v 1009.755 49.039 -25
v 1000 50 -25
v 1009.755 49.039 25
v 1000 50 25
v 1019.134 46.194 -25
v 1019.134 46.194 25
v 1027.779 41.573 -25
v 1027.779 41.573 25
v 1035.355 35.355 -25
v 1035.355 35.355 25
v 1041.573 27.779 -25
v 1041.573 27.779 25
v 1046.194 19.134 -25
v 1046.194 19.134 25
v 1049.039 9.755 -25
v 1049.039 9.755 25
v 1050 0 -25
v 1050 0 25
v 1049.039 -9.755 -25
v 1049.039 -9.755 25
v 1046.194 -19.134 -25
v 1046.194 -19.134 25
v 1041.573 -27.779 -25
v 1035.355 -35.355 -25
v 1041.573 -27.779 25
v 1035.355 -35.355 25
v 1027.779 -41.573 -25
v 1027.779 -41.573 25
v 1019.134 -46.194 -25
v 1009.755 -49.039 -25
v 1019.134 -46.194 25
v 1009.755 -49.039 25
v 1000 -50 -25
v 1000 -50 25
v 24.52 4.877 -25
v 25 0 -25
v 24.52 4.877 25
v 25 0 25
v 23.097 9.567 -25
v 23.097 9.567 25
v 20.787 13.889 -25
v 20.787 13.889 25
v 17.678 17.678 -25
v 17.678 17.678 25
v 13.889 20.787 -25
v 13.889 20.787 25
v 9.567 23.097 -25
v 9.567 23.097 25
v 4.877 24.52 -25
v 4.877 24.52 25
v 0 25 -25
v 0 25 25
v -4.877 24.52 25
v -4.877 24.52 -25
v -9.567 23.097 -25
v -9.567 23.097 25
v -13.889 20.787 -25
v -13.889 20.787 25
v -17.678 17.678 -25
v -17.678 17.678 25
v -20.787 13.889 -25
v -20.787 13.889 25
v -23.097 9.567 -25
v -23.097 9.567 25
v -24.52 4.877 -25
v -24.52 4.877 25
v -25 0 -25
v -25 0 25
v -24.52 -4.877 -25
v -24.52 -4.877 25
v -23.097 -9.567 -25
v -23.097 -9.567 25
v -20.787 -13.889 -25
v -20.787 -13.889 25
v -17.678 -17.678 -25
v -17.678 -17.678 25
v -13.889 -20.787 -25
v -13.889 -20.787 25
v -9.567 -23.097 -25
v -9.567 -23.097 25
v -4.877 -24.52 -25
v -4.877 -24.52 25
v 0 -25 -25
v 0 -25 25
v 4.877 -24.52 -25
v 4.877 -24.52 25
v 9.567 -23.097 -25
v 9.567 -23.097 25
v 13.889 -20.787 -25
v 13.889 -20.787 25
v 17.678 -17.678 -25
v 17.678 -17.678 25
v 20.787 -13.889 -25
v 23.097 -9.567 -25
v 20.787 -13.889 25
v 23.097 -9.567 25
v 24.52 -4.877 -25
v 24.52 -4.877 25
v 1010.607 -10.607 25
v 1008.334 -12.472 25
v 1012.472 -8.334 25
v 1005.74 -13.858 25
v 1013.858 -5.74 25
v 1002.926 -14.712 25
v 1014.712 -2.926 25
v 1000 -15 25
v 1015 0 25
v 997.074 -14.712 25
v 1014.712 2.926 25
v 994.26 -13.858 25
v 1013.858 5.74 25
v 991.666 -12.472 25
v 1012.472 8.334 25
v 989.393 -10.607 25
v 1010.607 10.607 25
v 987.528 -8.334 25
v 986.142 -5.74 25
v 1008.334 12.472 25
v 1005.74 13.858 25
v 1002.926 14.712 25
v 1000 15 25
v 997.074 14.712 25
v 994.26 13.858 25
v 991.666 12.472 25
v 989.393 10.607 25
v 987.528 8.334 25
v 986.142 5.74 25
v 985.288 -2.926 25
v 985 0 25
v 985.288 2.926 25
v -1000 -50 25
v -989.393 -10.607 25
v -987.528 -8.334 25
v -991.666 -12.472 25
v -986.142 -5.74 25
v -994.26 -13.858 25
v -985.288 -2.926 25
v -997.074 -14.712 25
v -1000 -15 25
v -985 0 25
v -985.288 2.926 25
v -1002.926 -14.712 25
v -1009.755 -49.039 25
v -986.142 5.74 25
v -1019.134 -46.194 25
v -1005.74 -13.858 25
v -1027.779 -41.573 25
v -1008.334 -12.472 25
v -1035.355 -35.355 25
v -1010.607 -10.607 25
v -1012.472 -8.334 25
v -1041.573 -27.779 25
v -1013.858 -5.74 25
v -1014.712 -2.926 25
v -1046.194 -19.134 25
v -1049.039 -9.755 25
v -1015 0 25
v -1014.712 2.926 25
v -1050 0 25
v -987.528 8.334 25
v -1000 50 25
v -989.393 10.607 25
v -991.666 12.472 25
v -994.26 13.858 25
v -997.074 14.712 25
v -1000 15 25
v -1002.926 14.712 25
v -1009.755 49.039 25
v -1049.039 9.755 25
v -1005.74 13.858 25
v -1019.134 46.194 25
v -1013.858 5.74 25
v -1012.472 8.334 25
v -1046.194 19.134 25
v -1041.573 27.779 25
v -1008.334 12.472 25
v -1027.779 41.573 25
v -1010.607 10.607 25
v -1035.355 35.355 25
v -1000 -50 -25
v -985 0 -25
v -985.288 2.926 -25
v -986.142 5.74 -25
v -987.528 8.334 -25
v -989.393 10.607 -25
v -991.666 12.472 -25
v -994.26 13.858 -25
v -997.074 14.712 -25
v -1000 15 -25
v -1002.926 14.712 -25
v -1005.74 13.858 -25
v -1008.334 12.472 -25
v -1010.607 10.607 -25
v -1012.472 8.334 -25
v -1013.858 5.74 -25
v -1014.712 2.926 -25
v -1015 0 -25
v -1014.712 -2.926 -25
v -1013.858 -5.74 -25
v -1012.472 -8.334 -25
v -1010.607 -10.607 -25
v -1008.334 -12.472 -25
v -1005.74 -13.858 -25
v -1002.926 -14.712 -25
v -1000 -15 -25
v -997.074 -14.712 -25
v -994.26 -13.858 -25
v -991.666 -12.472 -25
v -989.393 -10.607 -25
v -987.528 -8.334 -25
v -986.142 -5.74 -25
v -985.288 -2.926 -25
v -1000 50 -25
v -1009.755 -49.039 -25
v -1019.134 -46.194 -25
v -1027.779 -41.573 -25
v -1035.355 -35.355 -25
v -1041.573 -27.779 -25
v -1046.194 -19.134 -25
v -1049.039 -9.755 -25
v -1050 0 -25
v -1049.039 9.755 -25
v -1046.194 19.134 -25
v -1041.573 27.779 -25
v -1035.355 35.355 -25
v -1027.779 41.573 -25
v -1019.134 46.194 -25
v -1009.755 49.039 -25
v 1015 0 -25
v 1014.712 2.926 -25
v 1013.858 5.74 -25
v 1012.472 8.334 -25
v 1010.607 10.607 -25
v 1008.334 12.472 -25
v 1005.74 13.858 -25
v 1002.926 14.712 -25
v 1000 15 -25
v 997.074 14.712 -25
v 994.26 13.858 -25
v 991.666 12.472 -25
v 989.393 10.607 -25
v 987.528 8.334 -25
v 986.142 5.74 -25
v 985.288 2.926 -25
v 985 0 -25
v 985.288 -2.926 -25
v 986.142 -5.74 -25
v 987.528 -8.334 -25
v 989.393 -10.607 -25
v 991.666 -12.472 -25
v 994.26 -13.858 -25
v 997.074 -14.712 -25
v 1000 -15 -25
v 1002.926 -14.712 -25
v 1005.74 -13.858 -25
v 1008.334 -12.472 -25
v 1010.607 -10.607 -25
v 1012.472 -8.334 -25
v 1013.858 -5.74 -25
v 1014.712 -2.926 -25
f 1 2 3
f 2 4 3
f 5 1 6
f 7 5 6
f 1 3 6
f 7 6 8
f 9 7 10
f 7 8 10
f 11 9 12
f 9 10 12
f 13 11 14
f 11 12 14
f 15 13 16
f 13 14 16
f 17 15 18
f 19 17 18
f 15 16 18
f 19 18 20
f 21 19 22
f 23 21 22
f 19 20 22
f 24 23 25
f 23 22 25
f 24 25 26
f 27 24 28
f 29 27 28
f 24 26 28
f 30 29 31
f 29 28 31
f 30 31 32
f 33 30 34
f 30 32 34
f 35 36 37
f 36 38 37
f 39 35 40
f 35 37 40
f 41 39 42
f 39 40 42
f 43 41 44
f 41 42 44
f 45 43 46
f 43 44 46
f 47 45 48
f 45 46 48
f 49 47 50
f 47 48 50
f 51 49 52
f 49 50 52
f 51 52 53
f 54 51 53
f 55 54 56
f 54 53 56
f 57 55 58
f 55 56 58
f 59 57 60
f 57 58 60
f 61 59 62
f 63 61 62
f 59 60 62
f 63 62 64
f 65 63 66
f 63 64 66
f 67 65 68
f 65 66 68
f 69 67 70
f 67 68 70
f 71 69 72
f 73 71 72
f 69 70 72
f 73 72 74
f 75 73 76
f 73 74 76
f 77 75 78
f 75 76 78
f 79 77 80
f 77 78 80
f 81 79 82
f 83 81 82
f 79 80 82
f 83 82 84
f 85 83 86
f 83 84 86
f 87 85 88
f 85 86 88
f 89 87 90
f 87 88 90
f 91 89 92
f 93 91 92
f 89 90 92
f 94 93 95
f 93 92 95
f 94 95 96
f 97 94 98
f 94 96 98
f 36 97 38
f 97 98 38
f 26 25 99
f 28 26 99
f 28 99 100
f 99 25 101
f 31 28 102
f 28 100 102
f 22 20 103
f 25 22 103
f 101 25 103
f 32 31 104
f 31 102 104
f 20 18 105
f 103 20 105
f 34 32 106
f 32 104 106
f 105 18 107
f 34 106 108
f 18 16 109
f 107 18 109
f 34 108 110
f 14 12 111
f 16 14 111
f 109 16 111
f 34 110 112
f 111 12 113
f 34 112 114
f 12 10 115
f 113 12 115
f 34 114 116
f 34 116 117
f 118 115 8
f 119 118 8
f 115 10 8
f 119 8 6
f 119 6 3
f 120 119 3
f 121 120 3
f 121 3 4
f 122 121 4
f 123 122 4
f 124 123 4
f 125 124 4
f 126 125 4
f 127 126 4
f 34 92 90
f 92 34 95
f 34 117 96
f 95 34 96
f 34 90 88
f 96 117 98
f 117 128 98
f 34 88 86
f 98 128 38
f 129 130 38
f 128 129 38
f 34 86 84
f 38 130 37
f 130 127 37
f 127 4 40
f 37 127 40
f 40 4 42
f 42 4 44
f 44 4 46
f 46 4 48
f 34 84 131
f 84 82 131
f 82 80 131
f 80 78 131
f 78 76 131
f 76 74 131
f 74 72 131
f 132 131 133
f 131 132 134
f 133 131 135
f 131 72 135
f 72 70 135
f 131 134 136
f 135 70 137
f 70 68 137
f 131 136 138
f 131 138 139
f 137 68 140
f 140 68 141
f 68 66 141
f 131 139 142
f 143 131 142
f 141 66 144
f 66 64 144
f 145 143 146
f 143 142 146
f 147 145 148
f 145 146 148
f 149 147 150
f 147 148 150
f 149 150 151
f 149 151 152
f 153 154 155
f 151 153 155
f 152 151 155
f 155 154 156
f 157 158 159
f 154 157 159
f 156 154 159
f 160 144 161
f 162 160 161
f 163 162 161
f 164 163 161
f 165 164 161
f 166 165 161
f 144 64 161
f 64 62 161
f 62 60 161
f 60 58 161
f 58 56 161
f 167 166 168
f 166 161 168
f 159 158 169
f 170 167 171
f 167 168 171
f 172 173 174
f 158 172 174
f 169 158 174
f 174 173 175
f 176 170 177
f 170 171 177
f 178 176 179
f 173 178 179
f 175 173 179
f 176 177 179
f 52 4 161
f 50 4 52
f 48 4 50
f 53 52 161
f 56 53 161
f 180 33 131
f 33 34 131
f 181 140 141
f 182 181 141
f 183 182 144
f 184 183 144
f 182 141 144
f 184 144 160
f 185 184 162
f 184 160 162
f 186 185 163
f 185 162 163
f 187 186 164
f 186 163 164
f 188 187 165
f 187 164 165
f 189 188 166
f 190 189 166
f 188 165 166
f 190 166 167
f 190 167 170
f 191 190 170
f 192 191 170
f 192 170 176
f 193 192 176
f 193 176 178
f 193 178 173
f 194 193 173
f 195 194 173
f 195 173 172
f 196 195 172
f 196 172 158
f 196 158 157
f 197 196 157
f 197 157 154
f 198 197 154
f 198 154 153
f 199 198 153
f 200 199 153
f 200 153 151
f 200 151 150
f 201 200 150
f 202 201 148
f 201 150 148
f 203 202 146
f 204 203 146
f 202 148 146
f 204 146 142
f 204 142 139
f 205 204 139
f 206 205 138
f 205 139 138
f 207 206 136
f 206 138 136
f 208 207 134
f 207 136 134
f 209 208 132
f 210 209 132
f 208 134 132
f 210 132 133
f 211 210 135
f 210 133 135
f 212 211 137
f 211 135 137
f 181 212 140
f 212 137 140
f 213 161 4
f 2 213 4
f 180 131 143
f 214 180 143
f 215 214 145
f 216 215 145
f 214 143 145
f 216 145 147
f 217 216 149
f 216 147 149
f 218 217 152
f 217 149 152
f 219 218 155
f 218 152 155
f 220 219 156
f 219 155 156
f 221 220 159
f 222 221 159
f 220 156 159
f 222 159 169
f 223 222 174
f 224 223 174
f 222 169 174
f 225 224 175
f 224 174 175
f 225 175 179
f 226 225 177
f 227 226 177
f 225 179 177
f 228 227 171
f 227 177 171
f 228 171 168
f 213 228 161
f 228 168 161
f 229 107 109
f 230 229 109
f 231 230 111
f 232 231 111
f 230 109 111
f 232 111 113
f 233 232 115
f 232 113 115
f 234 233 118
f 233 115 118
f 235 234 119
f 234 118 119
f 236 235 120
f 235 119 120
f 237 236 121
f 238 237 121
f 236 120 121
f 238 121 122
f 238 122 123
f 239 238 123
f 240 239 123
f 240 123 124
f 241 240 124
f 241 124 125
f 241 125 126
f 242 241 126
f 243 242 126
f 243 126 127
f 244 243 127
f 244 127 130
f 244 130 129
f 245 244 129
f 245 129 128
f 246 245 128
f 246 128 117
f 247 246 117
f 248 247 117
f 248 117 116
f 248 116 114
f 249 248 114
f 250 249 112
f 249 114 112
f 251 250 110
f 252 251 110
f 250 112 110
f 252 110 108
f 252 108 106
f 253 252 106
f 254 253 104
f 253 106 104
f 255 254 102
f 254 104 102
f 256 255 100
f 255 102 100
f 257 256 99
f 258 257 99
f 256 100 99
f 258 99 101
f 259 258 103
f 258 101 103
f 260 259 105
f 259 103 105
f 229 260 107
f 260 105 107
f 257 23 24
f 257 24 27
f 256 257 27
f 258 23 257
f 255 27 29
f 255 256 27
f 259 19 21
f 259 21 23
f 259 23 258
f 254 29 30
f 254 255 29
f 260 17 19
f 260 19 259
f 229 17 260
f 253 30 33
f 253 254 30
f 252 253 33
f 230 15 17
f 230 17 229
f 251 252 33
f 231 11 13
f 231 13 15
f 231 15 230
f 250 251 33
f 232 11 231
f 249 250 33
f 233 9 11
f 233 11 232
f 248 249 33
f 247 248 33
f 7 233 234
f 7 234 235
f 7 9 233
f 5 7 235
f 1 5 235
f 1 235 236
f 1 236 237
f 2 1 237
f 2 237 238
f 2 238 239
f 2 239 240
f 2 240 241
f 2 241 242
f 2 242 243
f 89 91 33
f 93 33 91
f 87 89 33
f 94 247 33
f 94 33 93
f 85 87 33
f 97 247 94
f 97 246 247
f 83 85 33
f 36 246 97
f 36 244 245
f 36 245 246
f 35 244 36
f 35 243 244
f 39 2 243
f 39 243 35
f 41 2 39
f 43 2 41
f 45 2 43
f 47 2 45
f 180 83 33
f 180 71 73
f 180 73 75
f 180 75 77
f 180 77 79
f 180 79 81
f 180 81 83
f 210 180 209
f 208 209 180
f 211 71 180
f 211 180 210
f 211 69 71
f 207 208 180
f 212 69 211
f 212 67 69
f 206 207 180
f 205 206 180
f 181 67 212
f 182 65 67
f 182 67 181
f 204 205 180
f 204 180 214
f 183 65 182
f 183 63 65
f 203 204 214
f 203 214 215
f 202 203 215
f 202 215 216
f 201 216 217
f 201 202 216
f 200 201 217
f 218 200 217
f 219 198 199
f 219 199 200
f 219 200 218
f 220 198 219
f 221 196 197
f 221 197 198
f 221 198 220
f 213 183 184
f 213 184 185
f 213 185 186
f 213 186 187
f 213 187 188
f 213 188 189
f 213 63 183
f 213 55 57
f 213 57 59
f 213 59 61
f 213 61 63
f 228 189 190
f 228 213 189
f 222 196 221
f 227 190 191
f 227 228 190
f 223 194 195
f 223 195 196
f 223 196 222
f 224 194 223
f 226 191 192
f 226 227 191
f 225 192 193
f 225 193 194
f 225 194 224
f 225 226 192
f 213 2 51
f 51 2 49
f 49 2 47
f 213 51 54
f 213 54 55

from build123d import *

# Parameters (mm, degrees)
BOSS_EXTRUDE1_DEPTH     = 25
SKETCH2_R               = 15
CUT_EXTRUDE1_DEPTH      = 51
SKETCH3_R               = 25
CUT_EXTRUDE2_DEPTH      = 26
CUT_EXTRUDE2_DEPTH_BACK = 26


with BuildPart() as part:
    # Sketch1 → Boss-Extrude1 (new body, symmetric)
    with BuildSketch(Plane.XY):
        with BuildLine():
            Line((-1000, 50), (1000, 50))
            ThreePointArc((1000, 50), (1050, 0), (1000, -50))
            Line((1000, -50), (-1000, -50))
            ThreePointArc((-1000, -50), (-1050, 0), (-1000, 50))
        make_face()
    extrude(amount=BOSS_EXTRUDE1_DEPTH, both=True)

    # Sketch2 → Cut-Extrude1 (cut, through all)
    with BuildSketch(Plane.XY.offset(25)):
        with Locations((-1000, 0)):
            Circle(SKETCH2_R)
        with Locations((1000, 0)):
            Circle(SKETCH2_R)
    extrude(amount=-CUT_EXTRUDE1_DEPTH, mode=Mode.SUBTRACT)

    # Sketch3 → Cut-Extrude2 (cut, two sides)
    with BuildSketch(Plane.XY) as cut_extrude2_sk:
        Circle(SKETCH3_R)
    extrude(amount=CUT_EXTRUDE2_DEPTH, mode=Mode.SUBTRACT)
    extrude(cut_extrude2_sk.sketch, amount=-CUT_EXTRUDE2_DEPTH_BACK, mode=Mode.SUBTRACT)


solid = part.part
